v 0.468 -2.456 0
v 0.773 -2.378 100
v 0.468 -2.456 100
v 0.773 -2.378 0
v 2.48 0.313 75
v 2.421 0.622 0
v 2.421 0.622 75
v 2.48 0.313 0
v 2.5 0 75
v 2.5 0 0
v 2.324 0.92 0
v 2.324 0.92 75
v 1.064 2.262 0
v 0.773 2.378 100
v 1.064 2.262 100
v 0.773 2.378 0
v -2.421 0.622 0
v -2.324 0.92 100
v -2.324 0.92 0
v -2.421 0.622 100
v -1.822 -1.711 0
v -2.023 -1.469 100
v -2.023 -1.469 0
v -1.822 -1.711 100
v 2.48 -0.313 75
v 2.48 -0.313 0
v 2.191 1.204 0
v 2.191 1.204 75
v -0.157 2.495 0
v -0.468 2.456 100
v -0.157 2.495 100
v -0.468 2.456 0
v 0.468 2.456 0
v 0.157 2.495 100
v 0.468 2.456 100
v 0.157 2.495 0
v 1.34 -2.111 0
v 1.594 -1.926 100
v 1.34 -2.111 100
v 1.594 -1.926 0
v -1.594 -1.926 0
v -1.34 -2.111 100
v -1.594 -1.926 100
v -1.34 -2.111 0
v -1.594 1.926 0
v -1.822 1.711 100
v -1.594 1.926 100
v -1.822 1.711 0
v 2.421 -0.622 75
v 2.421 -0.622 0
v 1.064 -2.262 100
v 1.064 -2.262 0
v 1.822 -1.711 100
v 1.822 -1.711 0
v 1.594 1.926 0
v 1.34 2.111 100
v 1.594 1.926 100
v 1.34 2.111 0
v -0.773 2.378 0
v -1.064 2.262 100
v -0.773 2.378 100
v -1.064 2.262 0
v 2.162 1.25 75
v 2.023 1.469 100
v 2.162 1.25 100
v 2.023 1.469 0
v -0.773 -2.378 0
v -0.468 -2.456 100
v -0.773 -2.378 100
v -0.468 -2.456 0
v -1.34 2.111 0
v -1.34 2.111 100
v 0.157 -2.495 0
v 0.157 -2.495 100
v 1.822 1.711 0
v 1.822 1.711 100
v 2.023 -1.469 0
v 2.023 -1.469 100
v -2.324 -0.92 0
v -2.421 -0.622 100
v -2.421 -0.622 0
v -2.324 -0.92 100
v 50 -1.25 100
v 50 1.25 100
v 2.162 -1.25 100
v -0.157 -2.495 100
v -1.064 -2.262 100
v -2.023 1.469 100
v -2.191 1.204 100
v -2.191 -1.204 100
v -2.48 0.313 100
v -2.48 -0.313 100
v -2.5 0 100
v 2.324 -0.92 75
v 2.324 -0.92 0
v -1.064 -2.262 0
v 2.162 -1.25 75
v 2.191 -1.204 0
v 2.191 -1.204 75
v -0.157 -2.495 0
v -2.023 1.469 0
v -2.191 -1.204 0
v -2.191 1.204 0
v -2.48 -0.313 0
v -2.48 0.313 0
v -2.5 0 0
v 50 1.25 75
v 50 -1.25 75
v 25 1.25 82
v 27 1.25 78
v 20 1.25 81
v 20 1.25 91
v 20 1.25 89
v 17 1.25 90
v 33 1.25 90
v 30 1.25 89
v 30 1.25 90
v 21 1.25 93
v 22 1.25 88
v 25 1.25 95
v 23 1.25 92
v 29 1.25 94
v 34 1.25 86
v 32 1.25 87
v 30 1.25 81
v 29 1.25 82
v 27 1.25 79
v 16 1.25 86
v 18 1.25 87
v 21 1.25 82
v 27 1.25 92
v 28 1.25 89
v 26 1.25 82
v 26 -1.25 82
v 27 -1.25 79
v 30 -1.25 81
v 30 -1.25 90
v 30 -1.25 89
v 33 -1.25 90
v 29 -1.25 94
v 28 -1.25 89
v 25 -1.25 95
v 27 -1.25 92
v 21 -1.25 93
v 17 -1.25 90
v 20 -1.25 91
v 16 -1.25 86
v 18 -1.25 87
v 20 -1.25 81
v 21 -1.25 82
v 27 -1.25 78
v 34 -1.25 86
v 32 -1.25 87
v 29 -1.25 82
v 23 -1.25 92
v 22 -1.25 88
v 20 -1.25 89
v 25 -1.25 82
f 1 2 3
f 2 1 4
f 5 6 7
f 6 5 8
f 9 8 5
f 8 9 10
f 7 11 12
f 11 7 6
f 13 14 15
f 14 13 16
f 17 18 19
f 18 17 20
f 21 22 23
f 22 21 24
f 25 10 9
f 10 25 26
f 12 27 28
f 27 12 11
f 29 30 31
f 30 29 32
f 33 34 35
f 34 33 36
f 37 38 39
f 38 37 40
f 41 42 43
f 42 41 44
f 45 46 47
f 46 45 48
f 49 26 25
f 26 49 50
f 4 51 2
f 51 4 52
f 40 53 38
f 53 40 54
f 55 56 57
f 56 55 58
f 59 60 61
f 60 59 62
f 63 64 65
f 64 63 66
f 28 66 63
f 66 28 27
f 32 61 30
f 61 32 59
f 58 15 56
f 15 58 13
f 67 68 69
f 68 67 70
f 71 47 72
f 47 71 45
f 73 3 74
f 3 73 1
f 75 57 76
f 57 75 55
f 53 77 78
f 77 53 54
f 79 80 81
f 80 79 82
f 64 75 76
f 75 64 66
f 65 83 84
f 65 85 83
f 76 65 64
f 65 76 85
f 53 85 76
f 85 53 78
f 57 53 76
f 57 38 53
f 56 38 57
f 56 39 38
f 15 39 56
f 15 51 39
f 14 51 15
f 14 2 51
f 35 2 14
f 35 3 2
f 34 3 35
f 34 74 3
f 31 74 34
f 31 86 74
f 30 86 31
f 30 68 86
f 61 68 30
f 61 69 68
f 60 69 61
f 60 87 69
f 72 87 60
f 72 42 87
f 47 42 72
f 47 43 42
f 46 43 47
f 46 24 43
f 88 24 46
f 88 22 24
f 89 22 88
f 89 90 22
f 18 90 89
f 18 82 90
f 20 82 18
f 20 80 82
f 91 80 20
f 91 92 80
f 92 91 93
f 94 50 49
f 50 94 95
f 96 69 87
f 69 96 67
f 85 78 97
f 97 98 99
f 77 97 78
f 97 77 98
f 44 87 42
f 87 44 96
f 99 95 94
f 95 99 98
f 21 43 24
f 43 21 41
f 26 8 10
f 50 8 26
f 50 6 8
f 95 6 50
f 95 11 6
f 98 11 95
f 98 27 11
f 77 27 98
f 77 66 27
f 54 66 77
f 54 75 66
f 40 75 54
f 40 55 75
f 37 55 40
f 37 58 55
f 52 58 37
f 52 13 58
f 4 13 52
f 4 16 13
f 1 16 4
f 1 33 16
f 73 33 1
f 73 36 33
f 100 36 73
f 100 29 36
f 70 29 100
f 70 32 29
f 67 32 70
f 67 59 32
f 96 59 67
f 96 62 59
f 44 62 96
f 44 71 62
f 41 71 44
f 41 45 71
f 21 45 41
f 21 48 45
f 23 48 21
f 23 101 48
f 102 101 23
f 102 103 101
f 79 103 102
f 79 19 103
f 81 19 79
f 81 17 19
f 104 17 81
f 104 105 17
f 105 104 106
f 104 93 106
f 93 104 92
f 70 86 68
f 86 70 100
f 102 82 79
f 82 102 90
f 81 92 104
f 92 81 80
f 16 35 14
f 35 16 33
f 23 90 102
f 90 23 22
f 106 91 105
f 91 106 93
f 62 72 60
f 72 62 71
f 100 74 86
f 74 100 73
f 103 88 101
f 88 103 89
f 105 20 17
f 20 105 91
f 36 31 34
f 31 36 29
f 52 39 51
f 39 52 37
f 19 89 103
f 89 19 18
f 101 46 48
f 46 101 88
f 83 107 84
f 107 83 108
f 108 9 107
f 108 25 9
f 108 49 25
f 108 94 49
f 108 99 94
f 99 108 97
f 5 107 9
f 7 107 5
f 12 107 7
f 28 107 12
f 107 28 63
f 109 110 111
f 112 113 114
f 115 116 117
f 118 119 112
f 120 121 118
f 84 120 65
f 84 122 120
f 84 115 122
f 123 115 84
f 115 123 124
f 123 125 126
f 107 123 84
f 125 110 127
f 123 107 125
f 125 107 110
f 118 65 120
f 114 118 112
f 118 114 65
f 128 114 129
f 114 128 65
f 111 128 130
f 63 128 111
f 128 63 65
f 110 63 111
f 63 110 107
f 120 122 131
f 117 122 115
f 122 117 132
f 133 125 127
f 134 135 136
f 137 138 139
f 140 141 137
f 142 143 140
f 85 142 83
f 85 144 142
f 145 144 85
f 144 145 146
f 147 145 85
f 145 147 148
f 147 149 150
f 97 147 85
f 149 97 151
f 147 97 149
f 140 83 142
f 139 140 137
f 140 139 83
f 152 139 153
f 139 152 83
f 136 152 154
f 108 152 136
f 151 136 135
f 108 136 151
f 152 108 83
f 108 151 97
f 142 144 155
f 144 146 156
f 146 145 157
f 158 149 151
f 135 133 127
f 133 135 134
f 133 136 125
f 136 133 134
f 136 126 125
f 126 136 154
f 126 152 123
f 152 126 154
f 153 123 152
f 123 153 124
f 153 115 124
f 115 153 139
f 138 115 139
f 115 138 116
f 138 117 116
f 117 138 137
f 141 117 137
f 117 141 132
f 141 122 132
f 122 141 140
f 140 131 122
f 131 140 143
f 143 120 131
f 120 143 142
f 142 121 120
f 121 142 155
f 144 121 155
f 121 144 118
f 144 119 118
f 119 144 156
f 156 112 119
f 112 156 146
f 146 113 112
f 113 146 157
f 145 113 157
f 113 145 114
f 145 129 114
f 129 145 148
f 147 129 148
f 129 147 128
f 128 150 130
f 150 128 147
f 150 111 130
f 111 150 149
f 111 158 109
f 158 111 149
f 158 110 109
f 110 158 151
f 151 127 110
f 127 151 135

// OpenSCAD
// file: functions.scad
/*
 * The function keyword allows the programmer to define their own functions.
 * Parameters:
 *      name - string to determine the name for which your custom function will be referred to by
 *      parameters - zero or more arguments used within the scope of your function
 *      value - an expression to calculate the value to be returned
 */
function sum_of_squares(x, y) = x*x + y*y; // Returns the sum of squares for given numbers.
echo("1:  ", sum_of_squares(4, 8));
echo("2:  ", sum_of_squares(sum_of_squares(4, 4), sum_of_squares(8, 8))); // Functions can be parameters as well.

function rectangle_vertices(width, height) = [[0, 0], [width, 0], [width, height], [0, height]]; // Returns a vector.
polygon(rectangle_vertices(5, 10));

function fibonacci(n) = ((n < 2) ?  n : fibonacci(n - 1) + fibonacci(n - 2)); // Recursion is supported as well.
for (i = [1: 5]) // Exponential functions, be wary of larger values.
    echo(fibonacci(i));
// file: modules.scad
/*
 * Modules define object together in a single structure.
 * Parameters:
 *      name - name of the module
 *      parameters - parameters passed to the module to be used within its scope
 *      actions - statements made to produce an ouput
 */
module flag(height, flag_width, flag_height) {
    difference() {
        // Combine flag pole to flag backing.
        union() {
            flag_diameter = height/20;

            cylinder(d = flag_diameter, h = height, $fn = 50); // Flag pole.

            translate([0, -flag_diameter/4, height - flag_height]) // Move flag backing to the top of pole and center.
                cube([flag_width, flag_diameter/2, flag_height]); // Flag back, to be connected to pole and maple leaf.
        }

        // Subtract maple leaf from flag pole and flag backing.
        translate([25, 3, 85]) { // Move up flag pole and to the right.
            rotate([90, 0, 0]) { // Orient maple leaf wrt. pole.
                linear_extrude(height = 6) { // Convert 2D to 3D.
                    // Polygon with vertices made to look like a maple leaf.
                    polygon(points = [[1, -3], [5, -4], [4, -3], [9, 1], [7, 2], [8, 5], [5, 4], [5, 5],
                            [3, 4], [4, 9], [2, 7], [0,10], [-2, 7], [-4, 8], [-3, 3], [-5, 6],
                            [-5, 4], [-8, 5], [-7, 2], [-9, 1], [-4, -3], [-5,-4], [0, -3], [2, -7],
                            [2, -6], [1, -3]]);
                }
            }
        }
    }
}

flag(100, 50, 25); // Draws the flag by calling the flag module.
// main file
/*
 * Include and use draw code from another external file for use within the calling code.
 */

include <modules.scad> // Draws the flag as if it were pasted into this file.

use <functions.scad> // Allows us to use the functions written in the file.
echo(fibonacci(10));
